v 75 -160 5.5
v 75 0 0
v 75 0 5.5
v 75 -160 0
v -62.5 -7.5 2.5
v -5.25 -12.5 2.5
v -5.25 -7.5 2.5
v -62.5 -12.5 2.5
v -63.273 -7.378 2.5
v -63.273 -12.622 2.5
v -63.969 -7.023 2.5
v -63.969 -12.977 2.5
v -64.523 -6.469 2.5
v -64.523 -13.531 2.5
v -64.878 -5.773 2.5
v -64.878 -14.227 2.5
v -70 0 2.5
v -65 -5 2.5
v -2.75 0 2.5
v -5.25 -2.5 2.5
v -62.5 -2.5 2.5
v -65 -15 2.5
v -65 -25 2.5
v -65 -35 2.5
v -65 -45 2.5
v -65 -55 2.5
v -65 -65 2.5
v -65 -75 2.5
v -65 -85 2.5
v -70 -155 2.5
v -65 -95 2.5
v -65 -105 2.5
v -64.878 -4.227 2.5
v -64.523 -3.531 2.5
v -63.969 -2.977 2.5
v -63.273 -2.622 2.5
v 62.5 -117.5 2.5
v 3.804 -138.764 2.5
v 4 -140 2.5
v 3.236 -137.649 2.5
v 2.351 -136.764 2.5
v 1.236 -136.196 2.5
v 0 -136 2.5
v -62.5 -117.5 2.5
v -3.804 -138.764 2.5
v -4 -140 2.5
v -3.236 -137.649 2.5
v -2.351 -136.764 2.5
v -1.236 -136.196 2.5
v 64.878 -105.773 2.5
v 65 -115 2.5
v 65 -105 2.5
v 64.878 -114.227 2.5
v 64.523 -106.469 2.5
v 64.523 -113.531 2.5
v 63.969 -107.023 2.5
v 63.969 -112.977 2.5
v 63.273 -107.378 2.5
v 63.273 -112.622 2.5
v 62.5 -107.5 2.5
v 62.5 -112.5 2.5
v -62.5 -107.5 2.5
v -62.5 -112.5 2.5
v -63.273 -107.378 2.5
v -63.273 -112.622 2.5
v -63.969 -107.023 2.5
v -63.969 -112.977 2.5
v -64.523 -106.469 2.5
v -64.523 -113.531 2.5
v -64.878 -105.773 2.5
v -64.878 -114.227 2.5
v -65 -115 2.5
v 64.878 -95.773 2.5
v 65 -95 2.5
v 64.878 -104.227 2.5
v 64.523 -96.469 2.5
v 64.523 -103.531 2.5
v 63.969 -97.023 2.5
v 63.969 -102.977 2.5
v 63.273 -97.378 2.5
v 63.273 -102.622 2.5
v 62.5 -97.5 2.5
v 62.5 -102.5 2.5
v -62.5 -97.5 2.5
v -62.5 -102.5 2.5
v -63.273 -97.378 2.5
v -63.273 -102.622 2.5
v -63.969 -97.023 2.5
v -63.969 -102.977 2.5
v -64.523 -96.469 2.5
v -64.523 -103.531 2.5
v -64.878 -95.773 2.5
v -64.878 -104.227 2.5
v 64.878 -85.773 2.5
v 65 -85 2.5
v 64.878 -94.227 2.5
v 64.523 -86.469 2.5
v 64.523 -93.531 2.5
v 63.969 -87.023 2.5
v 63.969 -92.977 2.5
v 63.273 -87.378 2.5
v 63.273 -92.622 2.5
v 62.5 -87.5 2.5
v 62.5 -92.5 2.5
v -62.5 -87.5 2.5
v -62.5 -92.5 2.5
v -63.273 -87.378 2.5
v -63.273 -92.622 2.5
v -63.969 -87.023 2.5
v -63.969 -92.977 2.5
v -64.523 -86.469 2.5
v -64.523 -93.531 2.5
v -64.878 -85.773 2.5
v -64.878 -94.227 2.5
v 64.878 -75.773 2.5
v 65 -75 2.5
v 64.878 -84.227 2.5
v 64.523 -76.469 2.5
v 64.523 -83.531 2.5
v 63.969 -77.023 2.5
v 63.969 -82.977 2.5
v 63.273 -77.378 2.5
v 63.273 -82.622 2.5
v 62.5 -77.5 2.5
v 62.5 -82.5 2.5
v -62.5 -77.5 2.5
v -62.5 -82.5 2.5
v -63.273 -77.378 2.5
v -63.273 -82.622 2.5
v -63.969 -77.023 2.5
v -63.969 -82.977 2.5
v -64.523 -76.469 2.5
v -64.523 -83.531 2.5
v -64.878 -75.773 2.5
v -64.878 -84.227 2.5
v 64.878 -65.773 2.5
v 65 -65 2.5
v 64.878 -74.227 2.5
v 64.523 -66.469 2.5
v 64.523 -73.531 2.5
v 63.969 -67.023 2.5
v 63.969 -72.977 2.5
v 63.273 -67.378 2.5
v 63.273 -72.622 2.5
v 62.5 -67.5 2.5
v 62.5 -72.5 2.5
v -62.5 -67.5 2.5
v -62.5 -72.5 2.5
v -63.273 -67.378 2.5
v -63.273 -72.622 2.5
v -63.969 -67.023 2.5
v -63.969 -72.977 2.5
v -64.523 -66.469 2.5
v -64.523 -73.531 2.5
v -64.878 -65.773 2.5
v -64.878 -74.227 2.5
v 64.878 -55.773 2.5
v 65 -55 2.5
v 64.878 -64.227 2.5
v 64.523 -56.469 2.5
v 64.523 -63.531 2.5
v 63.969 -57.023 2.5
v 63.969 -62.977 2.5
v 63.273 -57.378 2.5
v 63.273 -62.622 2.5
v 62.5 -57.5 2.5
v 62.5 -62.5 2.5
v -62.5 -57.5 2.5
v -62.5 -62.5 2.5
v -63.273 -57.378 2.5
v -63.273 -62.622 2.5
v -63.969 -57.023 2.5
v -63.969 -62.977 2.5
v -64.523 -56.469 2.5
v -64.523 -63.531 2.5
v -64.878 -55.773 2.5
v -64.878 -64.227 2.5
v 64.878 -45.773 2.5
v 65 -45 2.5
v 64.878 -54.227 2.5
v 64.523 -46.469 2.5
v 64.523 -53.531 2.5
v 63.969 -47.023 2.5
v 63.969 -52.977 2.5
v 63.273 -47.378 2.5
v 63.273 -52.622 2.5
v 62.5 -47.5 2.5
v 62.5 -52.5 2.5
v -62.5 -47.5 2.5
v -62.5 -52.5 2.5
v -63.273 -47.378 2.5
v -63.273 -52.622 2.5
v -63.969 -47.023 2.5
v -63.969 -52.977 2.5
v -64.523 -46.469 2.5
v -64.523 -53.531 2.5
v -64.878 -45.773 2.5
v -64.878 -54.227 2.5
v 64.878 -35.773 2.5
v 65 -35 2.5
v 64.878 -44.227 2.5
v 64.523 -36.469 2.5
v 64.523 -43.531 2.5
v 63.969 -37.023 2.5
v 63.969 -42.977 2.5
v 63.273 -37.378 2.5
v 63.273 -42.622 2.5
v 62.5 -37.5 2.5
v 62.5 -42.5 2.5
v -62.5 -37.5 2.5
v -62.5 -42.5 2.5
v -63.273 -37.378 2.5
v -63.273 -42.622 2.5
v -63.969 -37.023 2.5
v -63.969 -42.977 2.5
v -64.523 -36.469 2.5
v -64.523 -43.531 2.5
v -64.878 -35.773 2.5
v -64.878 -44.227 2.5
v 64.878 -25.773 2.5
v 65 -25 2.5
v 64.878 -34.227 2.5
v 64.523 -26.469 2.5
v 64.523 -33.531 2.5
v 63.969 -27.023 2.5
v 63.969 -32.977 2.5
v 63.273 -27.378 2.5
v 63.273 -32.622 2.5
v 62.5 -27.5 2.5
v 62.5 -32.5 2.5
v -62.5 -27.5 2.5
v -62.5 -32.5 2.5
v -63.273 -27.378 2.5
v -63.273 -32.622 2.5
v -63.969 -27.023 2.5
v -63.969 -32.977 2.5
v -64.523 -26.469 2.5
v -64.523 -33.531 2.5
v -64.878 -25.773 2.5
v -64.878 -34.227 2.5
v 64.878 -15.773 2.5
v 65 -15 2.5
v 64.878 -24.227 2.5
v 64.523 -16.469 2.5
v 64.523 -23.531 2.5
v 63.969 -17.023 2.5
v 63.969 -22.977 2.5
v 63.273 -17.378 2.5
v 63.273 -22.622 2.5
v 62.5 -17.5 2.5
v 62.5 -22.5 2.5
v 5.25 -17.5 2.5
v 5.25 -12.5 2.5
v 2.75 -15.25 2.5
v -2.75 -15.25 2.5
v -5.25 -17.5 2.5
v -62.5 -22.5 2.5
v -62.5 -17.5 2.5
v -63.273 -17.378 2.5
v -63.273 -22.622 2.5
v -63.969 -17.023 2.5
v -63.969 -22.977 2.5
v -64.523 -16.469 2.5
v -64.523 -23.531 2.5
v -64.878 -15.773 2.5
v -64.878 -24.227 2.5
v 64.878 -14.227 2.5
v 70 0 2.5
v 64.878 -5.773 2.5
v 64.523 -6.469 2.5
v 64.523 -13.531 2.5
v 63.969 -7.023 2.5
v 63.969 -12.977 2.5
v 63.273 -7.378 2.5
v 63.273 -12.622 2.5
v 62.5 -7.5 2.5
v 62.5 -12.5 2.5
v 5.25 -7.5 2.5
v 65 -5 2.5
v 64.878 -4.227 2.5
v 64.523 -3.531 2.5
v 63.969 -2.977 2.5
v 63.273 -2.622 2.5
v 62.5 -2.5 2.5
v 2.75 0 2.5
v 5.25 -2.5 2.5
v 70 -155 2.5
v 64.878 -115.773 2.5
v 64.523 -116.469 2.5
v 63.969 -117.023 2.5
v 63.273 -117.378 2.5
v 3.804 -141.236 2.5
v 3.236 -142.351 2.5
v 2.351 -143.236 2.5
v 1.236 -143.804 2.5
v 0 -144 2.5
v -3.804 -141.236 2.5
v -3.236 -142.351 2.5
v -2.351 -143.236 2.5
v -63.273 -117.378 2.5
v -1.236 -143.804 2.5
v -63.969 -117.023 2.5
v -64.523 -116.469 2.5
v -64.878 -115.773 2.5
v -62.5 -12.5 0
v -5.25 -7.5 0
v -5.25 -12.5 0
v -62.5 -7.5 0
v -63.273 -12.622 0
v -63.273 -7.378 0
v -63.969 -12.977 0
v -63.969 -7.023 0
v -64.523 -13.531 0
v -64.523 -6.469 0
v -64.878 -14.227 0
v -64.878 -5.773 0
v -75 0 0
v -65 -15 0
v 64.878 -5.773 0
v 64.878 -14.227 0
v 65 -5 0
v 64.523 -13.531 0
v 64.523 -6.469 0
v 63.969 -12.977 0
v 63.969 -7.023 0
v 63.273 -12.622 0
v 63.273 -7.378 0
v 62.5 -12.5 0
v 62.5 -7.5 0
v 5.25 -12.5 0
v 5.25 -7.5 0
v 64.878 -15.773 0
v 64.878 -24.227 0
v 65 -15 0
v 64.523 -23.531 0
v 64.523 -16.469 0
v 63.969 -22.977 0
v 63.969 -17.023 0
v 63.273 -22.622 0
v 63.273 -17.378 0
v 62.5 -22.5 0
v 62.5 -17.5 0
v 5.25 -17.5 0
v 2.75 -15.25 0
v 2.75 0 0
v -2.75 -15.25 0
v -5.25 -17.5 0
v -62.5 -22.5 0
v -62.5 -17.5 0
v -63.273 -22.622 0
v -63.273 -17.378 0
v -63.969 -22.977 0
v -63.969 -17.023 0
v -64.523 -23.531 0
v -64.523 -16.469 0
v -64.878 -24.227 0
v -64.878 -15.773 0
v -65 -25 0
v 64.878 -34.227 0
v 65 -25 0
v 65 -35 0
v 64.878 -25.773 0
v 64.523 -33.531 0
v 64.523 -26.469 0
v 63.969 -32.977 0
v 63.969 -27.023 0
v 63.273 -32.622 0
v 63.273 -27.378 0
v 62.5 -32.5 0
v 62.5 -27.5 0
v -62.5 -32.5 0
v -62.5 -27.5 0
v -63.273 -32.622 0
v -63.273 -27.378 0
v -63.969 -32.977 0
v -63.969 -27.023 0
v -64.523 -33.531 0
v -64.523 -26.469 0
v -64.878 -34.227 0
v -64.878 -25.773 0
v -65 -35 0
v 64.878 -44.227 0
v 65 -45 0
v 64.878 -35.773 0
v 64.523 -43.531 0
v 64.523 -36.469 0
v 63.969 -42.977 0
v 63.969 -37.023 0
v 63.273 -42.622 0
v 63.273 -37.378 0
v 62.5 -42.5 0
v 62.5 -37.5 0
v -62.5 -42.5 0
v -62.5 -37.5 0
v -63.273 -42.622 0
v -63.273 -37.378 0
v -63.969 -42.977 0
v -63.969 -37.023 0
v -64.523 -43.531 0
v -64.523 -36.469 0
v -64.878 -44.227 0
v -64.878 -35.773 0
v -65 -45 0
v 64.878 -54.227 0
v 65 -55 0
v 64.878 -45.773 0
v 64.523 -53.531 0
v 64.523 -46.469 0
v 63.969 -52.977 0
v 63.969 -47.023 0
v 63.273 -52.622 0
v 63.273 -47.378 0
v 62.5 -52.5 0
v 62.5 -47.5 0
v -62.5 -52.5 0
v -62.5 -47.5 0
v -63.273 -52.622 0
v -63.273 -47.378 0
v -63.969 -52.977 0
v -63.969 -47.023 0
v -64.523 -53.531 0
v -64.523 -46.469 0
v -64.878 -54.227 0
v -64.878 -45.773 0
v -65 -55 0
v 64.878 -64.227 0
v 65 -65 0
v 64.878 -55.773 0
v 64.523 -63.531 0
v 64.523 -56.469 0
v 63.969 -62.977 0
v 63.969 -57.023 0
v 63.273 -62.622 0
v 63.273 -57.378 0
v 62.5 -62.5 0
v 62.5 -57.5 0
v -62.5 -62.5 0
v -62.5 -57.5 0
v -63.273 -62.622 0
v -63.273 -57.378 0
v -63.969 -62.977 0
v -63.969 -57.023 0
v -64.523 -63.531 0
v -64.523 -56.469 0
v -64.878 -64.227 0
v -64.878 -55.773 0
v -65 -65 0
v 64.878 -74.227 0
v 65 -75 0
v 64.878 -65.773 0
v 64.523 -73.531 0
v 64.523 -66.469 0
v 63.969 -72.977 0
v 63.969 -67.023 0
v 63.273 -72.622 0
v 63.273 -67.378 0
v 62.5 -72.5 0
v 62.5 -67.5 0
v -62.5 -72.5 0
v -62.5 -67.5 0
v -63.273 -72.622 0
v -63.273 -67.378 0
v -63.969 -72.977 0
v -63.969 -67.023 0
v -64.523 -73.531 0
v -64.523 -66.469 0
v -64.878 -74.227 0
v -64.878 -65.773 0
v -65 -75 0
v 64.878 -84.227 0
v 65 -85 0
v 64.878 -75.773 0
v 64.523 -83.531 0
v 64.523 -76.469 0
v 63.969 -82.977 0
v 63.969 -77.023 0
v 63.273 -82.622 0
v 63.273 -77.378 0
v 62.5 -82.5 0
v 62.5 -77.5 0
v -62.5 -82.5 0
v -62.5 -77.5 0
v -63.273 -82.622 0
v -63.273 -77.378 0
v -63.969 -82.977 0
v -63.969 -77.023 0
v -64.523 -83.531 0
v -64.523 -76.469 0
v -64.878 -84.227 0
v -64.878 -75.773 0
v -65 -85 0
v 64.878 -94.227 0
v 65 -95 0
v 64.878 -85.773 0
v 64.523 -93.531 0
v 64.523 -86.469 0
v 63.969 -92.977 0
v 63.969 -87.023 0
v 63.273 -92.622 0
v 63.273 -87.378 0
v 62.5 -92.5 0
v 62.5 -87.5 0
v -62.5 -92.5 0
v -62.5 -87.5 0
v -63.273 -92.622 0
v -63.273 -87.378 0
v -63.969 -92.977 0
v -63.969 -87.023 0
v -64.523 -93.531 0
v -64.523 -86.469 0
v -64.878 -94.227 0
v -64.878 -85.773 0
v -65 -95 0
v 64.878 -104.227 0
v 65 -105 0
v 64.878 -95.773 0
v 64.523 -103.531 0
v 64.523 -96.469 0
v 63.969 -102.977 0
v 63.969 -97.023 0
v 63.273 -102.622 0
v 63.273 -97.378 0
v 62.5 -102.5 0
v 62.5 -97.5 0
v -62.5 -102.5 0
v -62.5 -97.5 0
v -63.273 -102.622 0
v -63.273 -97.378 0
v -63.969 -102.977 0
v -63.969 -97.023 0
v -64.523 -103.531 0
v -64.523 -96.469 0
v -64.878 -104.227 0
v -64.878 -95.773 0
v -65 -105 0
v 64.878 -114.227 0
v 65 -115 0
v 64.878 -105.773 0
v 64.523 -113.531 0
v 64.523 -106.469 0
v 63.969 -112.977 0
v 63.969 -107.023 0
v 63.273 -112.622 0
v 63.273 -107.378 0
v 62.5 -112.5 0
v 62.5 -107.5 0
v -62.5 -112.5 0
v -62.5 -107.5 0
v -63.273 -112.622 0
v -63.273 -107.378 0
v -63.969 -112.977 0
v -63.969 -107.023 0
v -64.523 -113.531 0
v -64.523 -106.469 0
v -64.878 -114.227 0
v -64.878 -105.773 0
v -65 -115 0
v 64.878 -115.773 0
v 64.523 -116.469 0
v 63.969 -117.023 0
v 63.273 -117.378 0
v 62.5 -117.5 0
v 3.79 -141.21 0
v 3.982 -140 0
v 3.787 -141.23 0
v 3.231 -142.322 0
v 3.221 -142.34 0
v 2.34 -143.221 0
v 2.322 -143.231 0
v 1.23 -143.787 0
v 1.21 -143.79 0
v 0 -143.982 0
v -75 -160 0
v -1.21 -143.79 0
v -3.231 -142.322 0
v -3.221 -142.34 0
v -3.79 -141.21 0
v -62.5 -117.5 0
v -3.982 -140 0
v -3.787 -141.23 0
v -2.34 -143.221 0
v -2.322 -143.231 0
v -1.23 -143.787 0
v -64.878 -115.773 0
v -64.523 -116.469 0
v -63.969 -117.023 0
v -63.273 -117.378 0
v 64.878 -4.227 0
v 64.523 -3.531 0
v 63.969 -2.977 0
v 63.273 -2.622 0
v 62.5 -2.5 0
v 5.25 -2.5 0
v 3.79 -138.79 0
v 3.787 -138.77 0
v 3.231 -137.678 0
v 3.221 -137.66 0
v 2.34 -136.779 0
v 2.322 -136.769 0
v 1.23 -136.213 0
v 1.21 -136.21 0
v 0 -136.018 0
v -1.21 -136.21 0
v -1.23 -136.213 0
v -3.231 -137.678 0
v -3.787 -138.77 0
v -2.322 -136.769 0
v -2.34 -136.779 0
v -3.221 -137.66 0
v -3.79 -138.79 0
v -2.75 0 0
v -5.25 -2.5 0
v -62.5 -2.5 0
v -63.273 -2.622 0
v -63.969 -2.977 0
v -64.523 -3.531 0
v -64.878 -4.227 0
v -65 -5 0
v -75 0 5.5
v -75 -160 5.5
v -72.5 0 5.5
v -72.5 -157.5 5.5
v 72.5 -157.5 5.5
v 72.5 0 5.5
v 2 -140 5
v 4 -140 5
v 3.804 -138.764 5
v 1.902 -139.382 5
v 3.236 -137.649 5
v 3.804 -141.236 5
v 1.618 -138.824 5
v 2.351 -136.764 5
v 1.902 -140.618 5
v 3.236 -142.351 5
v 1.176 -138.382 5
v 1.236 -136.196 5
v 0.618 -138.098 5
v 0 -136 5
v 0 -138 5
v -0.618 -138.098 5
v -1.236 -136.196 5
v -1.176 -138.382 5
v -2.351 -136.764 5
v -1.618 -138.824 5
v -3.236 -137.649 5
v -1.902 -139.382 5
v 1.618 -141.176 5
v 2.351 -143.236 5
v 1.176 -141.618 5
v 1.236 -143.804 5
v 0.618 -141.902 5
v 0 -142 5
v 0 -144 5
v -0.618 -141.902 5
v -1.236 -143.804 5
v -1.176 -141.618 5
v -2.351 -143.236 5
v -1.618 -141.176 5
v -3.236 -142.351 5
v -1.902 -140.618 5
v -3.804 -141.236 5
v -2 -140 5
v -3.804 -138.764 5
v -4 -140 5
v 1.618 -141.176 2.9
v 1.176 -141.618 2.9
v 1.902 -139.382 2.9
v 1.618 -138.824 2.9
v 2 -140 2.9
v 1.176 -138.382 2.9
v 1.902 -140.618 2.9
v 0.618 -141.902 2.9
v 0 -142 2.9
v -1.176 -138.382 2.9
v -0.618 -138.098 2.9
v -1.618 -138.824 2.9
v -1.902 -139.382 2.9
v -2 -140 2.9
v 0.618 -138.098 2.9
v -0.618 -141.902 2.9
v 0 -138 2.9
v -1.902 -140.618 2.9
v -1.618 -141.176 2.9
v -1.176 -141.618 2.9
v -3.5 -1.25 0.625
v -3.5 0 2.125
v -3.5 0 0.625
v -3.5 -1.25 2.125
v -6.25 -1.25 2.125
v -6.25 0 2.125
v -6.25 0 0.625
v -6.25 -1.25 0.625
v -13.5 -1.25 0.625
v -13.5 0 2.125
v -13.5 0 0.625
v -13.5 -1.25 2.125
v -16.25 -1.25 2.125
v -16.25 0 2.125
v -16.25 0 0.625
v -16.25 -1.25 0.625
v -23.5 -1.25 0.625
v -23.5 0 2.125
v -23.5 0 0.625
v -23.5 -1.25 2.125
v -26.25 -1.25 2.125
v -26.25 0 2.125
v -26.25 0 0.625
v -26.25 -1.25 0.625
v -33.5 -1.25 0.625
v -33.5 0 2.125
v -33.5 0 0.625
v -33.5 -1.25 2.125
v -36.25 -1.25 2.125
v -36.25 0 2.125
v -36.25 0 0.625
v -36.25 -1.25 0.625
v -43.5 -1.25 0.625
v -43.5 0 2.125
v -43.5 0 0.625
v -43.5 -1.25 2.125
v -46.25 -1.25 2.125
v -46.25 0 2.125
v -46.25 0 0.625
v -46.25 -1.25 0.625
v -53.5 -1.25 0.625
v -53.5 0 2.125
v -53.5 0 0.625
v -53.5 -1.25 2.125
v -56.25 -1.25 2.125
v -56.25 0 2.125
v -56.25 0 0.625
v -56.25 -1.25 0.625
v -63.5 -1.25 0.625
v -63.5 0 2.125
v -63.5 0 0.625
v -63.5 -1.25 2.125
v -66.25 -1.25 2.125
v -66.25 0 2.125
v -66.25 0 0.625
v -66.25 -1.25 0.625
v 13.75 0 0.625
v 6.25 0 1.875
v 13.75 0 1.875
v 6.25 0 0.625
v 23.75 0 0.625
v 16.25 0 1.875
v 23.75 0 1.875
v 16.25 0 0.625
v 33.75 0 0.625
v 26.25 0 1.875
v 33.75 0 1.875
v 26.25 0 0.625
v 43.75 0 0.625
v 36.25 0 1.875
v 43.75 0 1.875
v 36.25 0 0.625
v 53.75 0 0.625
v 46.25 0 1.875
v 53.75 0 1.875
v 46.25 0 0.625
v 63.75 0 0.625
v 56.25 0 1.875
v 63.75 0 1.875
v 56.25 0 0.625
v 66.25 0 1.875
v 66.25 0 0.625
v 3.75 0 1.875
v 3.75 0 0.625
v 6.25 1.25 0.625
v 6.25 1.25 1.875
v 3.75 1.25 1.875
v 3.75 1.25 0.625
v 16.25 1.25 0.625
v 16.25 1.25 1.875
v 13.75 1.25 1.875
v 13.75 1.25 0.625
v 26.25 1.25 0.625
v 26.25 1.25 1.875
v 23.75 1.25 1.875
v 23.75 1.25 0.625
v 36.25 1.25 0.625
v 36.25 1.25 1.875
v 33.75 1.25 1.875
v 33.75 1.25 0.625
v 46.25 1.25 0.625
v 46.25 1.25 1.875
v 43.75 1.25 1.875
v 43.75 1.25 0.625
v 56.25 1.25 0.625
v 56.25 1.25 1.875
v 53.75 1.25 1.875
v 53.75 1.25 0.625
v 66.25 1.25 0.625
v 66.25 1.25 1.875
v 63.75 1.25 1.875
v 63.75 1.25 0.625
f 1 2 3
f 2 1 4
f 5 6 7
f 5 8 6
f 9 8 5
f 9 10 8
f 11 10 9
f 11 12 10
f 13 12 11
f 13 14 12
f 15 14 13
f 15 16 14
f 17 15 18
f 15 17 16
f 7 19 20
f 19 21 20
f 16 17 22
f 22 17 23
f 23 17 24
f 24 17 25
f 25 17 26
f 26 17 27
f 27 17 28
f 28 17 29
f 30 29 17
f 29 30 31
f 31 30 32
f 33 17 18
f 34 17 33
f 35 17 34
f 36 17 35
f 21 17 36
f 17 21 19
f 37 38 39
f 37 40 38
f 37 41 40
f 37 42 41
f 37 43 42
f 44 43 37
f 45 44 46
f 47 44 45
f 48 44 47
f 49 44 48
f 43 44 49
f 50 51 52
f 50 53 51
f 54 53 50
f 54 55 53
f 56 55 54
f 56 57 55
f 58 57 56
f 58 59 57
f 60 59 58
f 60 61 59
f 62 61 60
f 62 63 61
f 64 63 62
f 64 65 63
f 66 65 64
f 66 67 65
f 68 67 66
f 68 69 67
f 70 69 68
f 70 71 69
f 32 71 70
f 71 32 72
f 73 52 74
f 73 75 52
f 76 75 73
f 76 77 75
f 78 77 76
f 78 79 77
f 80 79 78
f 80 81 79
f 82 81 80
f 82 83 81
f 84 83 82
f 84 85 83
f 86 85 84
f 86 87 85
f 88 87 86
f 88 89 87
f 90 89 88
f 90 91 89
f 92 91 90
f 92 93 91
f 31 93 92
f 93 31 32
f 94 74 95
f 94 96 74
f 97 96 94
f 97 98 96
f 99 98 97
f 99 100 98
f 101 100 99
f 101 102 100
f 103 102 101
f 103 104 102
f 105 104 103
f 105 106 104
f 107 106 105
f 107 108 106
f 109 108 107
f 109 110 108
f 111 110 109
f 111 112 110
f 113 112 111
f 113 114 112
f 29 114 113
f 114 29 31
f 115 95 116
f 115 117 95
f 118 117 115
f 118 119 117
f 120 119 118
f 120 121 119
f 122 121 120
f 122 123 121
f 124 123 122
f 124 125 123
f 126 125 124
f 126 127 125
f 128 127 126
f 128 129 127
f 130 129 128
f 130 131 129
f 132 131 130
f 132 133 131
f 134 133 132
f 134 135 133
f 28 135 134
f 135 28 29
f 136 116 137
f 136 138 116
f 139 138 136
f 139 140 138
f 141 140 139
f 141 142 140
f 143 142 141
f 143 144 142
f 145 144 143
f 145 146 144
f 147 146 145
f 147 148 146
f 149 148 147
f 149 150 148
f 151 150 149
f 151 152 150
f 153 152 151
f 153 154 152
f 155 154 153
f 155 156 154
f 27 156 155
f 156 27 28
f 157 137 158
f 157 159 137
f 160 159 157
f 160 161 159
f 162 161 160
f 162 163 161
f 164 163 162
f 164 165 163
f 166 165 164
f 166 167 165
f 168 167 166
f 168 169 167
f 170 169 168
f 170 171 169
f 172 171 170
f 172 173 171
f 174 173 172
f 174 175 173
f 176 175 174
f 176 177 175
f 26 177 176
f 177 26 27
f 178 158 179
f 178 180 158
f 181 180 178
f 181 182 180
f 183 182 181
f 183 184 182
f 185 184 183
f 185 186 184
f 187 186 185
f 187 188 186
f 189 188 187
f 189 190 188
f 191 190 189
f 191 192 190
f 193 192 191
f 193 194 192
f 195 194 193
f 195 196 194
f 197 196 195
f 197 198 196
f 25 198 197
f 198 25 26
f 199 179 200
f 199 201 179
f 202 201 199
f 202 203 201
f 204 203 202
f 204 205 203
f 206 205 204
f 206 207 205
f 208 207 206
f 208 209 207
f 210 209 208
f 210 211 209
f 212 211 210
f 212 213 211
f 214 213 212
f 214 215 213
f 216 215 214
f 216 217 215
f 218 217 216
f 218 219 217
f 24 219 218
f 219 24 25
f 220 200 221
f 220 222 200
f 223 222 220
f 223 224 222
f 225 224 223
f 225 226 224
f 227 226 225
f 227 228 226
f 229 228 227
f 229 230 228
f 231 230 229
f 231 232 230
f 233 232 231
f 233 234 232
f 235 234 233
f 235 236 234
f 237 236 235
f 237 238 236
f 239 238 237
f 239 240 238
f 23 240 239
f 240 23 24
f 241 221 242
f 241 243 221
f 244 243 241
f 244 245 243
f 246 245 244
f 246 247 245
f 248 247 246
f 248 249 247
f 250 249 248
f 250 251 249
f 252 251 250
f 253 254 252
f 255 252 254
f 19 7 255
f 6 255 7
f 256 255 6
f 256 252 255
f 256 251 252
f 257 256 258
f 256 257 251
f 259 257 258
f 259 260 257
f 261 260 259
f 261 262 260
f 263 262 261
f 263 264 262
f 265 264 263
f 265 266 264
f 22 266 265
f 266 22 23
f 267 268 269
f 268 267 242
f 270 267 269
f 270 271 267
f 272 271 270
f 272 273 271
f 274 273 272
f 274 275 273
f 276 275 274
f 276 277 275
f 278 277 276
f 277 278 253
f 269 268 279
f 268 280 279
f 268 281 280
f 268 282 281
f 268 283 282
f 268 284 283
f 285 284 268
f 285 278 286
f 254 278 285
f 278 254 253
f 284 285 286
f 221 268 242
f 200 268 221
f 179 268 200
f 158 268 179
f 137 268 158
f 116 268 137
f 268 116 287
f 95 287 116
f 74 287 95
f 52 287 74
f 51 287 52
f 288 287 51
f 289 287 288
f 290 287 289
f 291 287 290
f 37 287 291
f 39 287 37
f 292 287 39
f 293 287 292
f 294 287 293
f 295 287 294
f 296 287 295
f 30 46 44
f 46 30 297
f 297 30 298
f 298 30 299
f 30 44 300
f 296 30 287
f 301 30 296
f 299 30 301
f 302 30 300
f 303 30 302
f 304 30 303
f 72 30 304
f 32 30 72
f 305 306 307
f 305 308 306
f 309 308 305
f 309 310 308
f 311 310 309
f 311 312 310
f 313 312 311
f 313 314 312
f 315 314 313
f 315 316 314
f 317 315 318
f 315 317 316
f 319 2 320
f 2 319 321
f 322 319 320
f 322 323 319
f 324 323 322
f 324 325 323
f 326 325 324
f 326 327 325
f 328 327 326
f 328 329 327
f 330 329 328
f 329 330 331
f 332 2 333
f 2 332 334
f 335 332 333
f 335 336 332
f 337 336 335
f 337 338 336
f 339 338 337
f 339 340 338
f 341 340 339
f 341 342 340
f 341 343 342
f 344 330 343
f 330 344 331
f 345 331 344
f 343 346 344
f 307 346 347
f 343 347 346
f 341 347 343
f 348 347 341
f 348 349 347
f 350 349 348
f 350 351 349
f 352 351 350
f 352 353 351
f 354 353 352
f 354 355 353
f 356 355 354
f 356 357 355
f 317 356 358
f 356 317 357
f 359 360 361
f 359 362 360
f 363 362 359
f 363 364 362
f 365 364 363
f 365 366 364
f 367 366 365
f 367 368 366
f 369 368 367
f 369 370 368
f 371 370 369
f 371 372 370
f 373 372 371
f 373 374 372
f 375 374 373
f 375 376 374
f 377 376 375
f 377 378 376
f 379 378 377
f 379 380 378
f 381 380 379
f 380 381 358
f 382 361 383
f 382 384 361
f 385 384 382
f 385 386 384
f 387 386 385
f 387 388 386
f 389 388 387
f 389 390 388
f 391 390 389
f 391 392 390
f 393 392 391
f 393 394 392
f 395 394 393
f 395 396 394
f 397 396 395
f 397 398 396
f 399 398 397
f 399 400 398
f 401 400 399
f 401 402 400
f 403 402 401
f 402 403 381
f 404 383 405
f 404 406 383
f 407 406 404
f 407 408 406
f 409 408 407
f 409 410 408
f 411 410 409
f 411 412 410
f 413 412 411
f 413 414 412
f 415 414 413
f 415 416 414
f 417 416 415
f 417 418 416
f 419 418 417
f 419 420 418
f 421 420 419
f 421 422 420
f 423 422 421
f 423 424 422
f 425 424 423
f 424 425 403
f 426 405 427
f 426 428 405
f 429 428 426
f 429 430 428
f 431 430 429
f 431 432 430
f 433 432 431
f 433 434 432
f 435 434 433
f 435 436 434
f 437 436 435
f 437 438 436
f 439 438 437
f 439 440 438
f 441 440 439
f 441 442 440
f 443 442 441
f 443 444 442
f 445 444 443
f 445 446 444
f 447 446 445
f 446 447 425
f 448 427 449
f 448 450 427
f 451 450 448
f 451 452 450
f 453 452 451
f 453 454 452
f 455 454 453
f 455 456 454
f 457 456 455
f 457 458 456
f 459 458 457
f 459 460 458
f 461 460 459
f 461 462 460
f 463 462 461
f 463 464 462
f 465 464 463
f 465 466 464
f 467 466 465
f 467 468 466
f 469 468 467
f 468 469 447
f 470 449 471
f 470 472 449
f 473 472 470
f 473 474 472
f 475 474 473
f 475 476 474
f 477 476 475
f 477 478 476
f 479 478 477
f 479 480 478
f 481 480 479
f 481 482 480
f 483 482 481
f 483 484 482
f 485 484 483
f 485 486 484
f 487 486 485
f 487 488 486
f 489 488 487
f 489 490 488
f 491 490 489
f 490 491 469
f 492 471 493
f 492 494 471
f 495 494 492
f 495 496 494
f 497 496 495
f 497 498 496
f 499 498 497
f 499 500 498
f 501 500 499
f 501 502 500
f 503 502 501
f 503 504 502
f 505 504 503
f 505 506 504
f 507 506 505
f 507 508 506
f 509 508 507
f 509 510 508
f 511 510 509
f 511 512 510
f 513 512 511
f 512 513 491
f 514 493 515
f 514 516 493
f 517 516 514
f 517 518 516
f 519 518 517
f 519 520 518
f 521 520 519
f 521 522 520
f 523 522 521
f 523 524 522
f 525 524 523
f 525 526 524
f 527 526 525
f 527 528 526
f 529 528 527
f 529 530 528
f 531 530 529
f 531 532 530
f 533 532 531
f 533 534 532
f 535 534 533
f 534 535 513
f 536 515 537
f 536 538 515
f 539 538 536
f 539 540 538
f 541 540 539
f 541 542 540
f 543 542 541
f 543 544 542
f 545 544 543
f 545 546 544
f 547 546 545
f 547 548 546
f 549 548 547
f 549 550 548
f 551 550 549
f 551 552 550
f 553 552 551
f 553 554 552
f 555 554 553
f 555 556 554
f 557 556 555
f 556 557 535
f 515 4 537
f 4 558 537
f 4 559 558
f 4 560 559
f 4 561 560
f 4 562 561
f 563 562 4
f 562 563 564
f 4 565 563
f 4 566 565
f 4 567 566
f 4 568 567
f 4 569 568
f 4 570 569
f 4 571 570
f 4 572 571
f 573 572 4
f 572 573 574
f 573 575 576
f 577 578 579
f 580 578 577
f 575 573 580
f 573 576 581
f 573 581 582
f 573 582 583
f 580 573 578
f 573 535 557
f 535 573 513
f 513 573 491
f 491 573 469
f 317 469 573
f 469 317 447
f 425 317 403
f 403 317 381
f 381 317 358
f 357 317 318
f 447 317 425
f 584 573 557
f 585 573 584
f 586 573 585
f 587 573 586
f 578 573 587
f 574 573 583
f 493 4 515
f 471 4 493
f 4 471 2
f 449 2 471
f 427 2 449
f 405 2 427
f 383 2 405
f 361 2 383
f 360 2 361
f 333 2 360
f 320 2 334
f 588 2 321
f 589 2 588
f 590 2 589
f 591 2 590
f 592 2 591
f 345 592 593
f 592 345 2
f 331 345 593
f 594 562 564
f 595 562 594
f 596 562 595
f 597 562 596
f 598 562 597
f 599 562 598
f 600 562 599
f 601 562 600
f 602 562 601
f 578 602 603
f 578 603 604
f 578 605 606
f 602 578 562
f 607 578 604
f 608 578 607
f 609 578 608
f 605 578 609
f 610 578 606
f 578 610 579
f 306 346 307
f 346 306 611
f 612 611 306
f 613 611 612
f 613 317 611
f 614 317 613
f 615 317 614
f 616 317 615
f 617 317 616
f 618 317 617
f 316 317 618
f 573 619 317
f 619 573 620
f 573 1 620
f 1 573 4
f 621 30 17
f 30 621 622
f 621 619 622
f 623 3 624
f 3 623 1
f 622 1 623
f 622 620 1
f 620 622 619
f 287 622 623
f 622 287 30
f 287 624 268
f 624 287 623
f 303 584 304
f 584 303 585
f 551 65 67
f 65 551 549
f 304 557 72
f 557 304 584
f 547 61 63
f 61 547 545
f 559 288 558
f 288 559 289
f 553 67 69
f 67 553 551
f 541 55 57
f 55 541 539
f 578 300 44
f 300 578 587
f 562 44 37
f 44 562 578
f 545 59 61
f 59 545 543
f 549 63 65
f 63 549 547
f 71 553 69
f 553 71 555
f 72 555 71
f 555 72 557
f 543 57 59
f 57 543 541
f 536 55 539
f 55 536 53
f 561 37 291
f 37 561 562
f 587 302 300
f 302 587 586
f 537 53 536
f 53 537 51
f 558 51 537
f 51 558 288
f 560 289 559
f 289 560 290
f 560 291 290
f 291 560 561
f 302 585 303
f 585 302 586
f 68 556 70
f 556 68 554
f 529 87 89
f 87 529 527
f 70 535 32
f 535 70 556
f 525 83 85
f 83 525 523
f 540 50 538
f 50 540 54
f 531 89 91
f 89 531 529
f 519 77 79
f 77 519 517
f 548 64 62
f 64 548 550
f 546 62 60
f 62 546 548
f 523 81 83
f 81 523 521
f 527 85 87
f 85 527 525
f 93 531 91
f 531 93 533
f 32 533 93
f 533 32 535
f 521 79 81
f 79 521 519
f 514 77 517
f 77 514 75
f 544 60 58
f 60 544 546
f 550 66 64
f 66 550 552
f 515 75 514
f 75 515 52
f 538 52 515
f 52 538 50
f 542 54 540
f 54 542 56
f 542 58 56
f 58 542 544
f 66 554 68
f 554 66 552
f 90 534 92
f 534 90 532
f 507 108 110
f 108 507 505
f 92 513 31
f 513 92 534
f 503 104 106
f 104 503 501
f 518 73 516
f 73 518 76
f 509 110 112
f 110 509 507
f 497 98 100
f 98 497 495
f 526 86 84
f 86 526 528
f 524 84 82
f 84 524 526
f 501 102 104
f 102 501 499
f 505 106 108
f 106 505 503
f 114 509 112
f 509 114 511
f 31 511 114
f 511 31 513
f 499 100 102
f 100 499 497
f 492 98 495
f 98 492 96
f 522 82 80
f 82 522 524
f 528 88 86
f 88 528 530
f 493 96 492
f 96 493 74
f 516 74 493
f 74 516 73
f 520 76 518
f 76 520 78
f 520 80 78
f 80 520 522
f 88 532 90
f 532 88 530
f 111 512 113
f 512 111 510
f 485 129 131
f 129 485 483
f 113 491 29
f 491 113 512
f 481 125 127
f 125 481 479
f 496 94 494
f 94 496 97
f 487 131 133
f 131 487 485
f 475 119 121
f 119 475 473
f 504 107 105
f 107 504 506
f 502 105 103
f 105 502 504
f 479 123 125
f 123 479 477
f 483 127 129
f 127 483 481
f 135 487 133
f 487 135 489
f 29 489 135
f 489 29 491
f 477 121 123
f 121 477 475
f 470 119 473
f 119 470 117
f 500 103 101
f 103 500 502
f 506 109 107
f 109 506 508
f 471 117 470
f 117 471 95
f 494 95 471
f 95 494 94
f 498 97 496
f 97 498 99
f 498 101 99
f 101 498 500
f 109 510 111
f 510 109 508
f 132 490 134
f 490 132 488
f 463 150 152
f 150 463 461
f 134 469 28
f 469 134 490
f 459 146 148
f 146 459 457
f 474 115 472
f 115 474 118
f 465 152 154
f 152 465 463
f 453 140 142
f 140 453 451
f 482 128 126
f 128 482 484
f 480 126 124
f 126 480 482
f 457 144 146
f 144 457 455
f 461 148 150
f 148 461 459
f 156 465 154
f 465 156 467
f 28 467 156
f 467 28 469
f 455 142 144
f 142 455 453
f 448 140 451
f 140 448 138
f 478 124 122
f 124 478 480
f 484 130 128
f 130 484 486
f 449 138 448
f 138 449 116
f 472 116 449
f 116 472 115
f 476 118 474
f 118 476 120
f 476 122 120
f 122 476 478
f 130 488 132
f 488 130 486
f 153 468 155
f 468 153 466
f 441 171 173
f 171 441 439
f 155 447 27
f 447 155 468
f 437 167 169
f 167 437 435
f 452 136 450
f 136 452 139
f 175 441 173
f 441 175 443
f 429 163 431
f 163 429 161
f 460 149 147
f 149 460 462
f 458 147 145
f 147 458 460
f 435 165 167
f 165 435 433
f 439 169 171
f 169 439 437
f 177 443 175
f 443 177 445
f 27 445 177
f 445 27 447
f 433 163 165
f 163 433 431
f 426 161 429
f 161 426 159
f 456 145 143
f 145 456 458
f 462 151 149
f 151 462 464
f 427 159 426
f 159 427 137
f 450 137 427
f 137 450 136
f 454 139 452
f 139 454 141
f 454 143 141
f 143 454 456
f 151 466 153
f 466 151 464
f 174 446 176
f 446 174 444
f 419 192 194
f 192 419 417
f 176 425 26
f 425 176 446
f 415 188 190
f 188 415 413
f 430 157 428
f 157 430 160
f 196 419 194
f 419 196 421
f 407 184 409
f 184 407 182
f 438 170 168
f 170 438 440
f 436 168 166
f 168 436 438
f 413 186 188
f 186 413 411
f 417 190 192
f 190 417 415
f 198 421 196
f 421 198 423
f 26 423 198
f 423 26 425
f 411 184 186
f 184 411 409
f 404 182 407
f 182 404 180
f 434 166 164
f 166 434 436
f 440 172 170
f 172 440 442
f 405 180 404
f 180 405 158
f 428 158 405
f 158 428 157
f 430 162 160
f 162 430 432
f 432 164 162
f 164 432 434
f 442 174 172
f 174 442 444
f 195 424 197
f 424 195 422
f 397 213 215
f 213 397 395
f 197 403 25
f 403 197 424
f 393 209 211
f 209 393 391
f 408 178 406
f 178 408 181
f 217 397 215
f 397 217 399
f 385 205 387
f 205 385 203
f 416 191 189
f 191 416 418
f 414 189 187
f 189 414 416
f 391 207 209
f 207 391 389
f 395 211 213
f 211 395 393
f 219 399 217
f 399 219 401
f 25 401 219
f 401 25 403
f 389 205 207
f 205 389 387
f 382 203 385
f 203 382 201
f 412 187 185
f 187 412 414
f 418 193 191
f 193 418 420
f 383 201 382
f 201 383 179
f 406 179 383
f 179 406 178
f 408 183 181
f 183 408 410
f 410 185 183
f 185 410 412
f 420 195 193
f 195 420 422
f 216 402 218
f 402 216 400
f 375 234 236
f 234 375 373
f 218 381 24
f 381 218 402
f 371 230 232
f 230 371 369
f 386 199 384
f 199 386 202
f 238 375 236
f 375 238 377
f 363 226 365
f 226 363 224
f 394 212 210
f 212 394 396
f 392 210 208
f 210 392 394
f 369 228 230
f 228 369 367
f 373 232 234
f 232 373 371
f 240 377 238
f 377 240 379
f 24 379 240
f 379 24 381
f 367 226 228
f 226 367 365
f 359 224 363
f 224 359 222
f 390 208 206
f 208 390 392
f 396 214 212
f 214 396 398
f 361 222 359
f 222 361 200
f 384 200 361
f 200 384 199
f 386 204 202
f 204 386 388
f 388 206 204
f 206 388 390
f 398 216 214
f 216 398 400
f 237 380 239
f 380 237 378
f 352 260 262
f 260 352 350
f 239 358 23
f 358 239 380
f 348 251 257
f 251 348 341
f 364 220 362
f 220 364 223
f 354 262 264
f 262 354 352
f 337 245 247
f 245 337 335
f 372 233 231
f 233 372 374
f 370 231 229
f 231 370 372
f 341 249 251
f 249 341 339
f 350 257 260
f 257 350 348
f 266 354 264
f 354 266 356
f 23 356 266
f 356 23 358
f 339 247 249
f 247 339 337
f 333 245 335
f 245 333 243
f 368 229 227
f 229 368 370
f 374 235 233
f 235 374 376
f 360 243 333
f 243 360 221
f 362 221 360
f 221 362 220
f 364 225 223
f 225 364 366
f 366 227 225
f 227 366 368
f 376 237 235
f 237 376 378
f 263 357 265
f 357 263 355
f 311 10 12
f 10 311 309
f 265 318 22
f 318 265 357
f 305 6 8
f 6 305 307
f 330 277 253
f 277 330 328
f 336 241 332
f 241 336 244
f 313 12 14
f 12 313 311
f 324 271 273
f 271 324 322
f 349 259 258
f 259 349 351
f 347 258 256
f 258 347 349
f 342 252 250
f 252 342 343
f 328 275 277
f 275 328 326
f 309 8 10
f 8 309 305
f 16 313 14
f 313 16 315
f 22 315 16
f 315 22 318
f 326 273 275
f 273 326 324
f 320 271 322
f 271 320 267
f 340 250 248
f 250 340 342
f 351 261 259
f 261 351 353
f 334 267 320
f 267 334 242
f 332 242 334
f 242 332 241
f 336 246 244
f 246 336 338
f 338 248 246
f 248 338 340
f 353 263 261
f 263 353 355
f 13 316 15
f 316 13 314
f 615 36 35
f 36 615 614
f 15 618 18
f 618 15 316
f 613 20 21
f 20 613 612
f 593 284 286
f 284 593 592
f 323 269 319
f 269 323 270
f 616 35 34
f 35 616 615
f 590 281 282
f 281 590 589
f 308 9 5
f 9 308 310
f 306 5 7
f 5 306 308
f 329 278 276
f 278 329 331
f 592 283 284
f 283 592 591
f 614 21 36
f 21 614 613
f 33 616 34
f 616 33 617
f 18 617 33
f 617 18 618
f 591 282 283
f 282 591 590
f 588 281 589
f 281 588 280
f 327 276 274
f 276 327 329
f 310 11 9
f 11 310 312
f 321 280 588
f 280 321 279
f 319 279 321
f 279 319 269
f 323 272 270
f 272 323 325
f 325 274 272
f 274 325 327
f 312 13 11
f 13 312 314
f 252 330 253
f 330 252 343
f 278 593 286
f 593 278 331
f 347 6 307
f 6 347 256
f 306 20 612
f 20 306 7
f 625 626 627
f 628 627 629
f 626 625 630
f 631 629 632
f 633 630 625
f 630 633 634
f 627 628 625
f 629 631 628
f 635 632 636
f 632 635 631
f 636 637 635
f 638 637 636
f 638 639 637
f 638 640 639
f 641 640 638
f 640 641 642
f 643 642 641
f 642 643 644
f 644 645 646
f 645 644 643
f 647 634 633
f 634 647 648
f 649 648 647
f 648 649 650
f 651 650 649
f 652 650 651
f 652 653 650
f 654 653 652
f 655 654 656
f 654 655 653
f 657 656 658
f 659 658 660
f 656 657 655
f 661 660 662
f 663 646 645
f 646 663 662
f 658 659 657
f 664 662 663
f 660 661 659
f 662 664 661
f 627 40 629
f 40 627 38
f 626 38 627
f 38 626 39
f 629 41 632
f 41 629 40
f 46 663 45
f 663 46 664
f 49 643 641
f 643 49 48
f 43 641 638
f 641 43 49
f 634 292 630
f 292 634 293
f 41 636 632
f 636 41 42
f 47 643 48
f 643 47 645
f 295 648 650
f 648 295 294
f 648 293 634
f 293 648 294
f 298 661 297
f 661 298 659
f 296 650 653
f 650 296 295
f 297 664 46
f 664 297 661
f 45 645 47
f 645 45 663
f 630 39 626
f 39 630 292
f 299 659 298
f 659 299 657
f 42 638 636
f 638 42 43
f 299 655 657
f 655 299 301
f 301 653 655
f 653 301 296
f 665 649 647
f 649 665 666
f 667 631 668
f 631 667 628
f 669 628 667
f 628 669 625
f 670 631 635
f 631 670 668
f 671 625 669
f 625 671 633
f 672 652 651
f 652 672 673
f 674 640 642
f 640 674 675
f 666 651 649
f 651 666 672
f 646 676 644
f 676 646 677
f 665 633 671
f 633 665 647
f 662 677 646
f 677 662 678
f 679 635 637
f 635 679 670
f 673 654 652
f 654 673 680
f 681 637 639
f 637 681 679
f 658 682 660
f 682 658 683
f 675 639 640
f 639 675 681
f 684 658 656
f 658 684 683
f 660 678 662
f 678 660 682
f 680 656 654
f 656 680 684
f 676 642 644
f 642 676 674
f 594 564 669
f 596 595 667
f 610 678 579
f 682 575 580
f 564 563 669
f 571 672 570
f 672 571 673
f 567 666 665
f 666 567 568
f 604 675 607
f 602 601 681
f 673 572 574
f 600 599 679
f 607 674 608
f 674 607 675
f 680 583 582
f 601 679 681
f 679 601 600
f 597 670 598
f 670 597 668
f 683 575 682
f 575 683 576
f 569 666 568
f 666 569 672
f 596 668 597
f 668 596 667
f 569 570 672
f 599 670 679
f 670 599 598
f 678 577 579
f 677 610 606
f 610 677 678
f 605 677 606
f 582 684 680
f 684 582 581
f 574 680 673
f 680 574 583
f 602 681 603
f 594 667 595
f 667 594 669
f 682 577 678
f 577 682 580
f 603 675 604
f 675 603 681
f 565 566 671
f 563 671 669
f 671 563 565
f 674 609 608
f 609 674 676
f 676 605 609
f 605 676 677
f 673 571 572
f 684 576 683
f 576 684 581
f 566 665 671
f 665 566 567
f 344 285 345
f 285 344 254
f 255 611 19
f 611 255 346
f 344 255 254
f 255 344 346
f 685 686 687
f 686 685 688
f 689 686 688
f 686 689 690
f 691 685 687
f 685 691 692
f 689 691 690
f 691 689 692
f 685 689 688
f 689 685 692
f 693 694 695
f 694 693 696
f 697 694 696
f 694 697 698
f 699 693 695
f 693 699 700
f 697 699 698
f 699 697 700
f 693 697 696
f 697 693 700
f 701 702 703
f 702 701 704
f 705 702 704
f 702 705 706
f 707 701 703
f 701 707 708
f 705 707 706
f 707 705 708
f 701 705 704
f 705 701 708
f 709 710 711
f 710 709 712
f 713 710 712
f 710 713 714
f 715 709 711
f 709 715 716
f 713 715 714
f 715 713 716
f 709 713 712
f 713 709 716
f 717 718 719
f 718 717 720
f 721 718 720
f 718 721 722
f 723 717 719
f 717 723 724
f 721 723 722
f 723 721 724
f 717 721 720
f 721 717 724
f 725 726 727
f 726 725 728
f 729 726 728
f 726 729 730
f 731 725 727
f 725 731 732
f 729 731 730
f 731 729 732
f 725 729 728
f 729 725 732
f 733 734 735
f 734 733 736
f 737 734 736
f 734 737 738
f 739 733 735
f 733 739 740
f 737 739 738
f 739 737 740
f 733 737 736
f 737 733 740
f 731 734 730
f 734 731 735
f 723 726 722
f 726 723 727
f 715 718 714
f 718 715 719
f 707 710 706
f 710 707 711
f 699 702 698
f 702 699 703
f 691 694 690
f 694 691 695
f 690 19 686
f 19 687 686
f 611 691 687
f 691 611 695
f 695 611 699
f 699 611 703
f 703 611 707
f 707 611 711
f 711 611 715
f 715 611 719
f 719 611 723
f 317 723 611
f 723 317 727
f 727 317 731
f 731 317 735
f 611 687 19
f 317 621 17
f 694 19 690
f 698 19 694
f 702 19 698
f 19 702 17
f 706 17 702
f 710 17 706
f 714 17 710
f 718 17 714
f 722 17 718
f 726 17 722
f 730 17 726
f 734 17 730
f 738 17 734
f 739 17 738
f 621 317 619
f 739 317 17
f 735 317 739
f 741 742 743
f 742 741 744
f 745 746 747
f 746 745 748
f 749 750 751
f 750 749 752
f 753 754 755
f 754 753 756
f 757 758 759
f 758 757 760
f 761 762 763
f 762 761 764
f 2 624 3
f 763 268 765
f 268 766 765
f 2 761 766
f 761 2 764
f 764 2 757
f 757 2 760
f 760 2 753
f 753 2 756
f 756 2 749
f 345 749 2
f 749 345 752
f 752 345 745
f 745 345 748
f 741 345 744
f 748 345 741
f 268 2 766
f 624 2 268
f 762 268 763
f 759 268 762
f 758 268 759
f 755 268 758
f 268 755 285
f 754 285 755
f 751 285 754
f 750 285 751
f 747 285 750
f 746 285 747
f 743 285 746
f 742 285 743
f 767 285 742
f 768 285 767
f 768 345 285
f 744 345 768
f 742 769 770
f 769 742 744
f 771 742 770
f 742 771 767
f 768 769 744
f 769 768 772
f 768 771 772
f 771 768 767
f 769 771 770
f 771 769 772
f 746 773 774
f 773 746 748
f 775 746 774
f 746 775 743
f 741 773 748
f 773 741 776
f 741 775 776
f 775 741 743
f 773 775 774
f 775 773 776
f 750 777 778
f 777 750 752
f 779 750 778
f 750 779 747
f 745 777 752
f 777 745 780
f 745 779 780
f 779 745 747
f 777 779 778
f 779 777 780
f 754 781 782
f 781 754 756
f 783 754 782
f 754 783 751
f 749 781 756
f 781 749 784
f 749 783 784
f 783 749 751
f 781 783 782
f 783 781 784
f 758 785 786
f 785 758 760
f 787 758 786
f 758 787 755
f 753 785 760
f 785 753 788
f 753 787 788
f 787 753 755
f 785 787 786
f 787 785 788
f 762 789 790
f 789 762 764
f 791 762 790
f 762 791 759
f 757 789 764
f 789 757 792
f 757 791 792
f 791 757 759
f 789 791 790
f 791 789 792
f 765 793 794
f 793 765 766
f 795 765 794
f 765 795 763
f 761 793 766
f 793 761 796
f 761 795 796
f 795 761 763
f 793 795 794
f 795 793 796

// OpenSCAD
$fn =20;
clampLength = 330;
clampWidth = 20;
boltDiameter = 3;
boltOffset = clampLength/2 - 25;
threadHeight = 10;
wallThickness = 2.5;
gap = 0.5;
grilleLength = 320;
grilleWidth = 150;
grilleEdgeHeight = 2 * wallThickness + gap;
louvreWidth = 10;
louvreLength = grilleWidth-20;
sliderWidth = 5;
sliderLength = 20;
sliderHeight = 10;
damperWidth = grilleWidth-10;
// Max out the damper length to printer max.
damperLength = 250;

module clamp() {
    difference() {
        union() {
            translate([0,0,wallThickness/2])
                cube([clampWidth, clampLength, wallThickness], center = true);
            translate([0,boltOffset,threadHeight/2])
                cylinder(h=threadHeight,
                    d=boltDiameter+2*wallThickness, center=true);
            translate([0,-(boltOffset),threadHeight/2])
                cylinder(h=threadHeight,
                    d=boltDiameter+2*wallThickness, center=true);
        }
        translate([0,boltOffset,threadHeight/2-0.1])
            cylinder(h=threadHeight+0.3,
                d=boltDiameter, center=true);
        translate([0,-(boltOffset),threadHeight/2-0.1])
            cylinder(h=threadHeight+0.3,
                d=boltDiameter, center=true);
    }
}

module damper() {
    limit = ((damperLength/2)/louvreWidth)-1;
    difference() {
        translate([0,0,wallThickness/2])
            cube([damperWidth,damperLength,wallThickness],
                center=true);
        for(index = [-limit : limit])
            louvreOpening(index);
    }
    // Add in the knob for the slider
    translate([0,0,sliderHeight/2])
        cube([sliderWidth,sliderLength,sliderHeight],
            center = true);
}

module edgeSegment(length) {
    rotate([90,0,0])
        linear_extrude(height = length)
            polygon([[0,0],
                [0,wallThickness+gap],
                [wallThickness,wallThickness+gap],
                [2*wallThickness,0]]);
}

module louvreOpening(index) {
    translate([0,index * louvreWidth,-gap])
        linear_extrude(height = wallThickness*2)
            hull() {
                translate([-(louvreLength-louvreWidth/2)/2,0,0])
                    circle(d = louvreWidth/2);
                translate([(louvreLength-louvreWidth/2)/2,0,0])
                    circle(d = louvreWidth/2);
            }
}

module grilleBeforeHoles() {
    union() {
        translate([0,0,wallThickness/2])
            cube([grilleWidth, grilleLength, wallThickness], center = true);
        translate([-grilleWidth/2,grilleLength/2,wallThickness])
            edgeSegment(grilleLength);
        rotate([0,0,90])
            translate([-grilleLength/2,grilleWidth/2,wallThickness])
                edgeSegment(grilleWidth);
        rotate([0,0,180])
            translate([-grilleWidth/2,grilleLength/2,wallThickness])
                edgeSegment(grilleLength);
        rotate([0,0,270])
            translate([-grilleLength/2,grilleWidth/2,wallThickness])
                edgeSegment(grilleWidth);
    }
}

module grilleWithLouvres() {
    limit = ((damperLength/2)/louvreWidth)-1;
    difference() {
        grilleBeforeHoles();
        for(index = [-limit : limit])
            louvreOpening(index);
        
    }
}

module boltHole() {
    boltHeadDiameter = 8.1;
    boltHeadHeight = 3;
    boltThickness = boltDiameter + 1;
    union() {
        translate([0,0,(2*wallThickness+0.3)/2])
            cylinder(h=2*wallThickness+0.3,
                d=boltThickness, center=true);
        // Adjust for countersink
        translate([0,0,boltHeadHeight/2])
            cylinder(h = boltHeadHeight, d1 = boltHeadDiameter, d2 = boltThickness, center = true);
    }
}

module grille() {
    difference() {
        union() {
            grilleWithLouvres();
            translate([0,0,wallThickness/2])
                cube([sliderWidth+2*wallThickness+gap,
                    louvreWidth+sliderLength+2*wallThickness+gap, wallThickness],
                    center = true);
            translate([0,boltOffset,wallThickness])
                cylinder(h=2*wallThickness,
                    d=boltDiameter+2*wallThickness, center=true);
            translate([0,-(boltOffset),wallThickness])
                cylinder(h=2*wallThickness,
                    d=boltDiameter+2*wallThickness, center=true);
        }
        translate([0,0,wallThickness/2])
            cube([sliderWidth+gap,
                louvreWidth+sliderLength+gap, 2*wallThickness+gap],
                center = true);
        translate([0,boltOffset,-0.1])
            boltHole();
        translate([0,-(boltOffset),-0.1])
            boltHole();
    }
}

module stud(extra,xOffset) {
    translate([xOffset+extra/2,extra/2,
        (wallThickness/2+extra/2)])
            cube([wallThickness+extra, wallThickness+extra,
                wallThickness/2+extra], center=true);
}


difference(){
    grille();
    translate([-(grilleWidth+gap)/2,0,-gap/2])
        cube([grilleWidth+gap,grilleLength/2+gap,   
            grilleEdgeHeight+gap]);
    for(xOffset = [sliderWidth : louvreWidth : 
        grilleWidth/2 - louvreWidth])
            stud(gap/2,-xOffset);
}
for(xOffset = [sliderWidth : louvreWidth : 
    grilleWidth/2 - louvreWidth])
        stud(0,xOffset);
